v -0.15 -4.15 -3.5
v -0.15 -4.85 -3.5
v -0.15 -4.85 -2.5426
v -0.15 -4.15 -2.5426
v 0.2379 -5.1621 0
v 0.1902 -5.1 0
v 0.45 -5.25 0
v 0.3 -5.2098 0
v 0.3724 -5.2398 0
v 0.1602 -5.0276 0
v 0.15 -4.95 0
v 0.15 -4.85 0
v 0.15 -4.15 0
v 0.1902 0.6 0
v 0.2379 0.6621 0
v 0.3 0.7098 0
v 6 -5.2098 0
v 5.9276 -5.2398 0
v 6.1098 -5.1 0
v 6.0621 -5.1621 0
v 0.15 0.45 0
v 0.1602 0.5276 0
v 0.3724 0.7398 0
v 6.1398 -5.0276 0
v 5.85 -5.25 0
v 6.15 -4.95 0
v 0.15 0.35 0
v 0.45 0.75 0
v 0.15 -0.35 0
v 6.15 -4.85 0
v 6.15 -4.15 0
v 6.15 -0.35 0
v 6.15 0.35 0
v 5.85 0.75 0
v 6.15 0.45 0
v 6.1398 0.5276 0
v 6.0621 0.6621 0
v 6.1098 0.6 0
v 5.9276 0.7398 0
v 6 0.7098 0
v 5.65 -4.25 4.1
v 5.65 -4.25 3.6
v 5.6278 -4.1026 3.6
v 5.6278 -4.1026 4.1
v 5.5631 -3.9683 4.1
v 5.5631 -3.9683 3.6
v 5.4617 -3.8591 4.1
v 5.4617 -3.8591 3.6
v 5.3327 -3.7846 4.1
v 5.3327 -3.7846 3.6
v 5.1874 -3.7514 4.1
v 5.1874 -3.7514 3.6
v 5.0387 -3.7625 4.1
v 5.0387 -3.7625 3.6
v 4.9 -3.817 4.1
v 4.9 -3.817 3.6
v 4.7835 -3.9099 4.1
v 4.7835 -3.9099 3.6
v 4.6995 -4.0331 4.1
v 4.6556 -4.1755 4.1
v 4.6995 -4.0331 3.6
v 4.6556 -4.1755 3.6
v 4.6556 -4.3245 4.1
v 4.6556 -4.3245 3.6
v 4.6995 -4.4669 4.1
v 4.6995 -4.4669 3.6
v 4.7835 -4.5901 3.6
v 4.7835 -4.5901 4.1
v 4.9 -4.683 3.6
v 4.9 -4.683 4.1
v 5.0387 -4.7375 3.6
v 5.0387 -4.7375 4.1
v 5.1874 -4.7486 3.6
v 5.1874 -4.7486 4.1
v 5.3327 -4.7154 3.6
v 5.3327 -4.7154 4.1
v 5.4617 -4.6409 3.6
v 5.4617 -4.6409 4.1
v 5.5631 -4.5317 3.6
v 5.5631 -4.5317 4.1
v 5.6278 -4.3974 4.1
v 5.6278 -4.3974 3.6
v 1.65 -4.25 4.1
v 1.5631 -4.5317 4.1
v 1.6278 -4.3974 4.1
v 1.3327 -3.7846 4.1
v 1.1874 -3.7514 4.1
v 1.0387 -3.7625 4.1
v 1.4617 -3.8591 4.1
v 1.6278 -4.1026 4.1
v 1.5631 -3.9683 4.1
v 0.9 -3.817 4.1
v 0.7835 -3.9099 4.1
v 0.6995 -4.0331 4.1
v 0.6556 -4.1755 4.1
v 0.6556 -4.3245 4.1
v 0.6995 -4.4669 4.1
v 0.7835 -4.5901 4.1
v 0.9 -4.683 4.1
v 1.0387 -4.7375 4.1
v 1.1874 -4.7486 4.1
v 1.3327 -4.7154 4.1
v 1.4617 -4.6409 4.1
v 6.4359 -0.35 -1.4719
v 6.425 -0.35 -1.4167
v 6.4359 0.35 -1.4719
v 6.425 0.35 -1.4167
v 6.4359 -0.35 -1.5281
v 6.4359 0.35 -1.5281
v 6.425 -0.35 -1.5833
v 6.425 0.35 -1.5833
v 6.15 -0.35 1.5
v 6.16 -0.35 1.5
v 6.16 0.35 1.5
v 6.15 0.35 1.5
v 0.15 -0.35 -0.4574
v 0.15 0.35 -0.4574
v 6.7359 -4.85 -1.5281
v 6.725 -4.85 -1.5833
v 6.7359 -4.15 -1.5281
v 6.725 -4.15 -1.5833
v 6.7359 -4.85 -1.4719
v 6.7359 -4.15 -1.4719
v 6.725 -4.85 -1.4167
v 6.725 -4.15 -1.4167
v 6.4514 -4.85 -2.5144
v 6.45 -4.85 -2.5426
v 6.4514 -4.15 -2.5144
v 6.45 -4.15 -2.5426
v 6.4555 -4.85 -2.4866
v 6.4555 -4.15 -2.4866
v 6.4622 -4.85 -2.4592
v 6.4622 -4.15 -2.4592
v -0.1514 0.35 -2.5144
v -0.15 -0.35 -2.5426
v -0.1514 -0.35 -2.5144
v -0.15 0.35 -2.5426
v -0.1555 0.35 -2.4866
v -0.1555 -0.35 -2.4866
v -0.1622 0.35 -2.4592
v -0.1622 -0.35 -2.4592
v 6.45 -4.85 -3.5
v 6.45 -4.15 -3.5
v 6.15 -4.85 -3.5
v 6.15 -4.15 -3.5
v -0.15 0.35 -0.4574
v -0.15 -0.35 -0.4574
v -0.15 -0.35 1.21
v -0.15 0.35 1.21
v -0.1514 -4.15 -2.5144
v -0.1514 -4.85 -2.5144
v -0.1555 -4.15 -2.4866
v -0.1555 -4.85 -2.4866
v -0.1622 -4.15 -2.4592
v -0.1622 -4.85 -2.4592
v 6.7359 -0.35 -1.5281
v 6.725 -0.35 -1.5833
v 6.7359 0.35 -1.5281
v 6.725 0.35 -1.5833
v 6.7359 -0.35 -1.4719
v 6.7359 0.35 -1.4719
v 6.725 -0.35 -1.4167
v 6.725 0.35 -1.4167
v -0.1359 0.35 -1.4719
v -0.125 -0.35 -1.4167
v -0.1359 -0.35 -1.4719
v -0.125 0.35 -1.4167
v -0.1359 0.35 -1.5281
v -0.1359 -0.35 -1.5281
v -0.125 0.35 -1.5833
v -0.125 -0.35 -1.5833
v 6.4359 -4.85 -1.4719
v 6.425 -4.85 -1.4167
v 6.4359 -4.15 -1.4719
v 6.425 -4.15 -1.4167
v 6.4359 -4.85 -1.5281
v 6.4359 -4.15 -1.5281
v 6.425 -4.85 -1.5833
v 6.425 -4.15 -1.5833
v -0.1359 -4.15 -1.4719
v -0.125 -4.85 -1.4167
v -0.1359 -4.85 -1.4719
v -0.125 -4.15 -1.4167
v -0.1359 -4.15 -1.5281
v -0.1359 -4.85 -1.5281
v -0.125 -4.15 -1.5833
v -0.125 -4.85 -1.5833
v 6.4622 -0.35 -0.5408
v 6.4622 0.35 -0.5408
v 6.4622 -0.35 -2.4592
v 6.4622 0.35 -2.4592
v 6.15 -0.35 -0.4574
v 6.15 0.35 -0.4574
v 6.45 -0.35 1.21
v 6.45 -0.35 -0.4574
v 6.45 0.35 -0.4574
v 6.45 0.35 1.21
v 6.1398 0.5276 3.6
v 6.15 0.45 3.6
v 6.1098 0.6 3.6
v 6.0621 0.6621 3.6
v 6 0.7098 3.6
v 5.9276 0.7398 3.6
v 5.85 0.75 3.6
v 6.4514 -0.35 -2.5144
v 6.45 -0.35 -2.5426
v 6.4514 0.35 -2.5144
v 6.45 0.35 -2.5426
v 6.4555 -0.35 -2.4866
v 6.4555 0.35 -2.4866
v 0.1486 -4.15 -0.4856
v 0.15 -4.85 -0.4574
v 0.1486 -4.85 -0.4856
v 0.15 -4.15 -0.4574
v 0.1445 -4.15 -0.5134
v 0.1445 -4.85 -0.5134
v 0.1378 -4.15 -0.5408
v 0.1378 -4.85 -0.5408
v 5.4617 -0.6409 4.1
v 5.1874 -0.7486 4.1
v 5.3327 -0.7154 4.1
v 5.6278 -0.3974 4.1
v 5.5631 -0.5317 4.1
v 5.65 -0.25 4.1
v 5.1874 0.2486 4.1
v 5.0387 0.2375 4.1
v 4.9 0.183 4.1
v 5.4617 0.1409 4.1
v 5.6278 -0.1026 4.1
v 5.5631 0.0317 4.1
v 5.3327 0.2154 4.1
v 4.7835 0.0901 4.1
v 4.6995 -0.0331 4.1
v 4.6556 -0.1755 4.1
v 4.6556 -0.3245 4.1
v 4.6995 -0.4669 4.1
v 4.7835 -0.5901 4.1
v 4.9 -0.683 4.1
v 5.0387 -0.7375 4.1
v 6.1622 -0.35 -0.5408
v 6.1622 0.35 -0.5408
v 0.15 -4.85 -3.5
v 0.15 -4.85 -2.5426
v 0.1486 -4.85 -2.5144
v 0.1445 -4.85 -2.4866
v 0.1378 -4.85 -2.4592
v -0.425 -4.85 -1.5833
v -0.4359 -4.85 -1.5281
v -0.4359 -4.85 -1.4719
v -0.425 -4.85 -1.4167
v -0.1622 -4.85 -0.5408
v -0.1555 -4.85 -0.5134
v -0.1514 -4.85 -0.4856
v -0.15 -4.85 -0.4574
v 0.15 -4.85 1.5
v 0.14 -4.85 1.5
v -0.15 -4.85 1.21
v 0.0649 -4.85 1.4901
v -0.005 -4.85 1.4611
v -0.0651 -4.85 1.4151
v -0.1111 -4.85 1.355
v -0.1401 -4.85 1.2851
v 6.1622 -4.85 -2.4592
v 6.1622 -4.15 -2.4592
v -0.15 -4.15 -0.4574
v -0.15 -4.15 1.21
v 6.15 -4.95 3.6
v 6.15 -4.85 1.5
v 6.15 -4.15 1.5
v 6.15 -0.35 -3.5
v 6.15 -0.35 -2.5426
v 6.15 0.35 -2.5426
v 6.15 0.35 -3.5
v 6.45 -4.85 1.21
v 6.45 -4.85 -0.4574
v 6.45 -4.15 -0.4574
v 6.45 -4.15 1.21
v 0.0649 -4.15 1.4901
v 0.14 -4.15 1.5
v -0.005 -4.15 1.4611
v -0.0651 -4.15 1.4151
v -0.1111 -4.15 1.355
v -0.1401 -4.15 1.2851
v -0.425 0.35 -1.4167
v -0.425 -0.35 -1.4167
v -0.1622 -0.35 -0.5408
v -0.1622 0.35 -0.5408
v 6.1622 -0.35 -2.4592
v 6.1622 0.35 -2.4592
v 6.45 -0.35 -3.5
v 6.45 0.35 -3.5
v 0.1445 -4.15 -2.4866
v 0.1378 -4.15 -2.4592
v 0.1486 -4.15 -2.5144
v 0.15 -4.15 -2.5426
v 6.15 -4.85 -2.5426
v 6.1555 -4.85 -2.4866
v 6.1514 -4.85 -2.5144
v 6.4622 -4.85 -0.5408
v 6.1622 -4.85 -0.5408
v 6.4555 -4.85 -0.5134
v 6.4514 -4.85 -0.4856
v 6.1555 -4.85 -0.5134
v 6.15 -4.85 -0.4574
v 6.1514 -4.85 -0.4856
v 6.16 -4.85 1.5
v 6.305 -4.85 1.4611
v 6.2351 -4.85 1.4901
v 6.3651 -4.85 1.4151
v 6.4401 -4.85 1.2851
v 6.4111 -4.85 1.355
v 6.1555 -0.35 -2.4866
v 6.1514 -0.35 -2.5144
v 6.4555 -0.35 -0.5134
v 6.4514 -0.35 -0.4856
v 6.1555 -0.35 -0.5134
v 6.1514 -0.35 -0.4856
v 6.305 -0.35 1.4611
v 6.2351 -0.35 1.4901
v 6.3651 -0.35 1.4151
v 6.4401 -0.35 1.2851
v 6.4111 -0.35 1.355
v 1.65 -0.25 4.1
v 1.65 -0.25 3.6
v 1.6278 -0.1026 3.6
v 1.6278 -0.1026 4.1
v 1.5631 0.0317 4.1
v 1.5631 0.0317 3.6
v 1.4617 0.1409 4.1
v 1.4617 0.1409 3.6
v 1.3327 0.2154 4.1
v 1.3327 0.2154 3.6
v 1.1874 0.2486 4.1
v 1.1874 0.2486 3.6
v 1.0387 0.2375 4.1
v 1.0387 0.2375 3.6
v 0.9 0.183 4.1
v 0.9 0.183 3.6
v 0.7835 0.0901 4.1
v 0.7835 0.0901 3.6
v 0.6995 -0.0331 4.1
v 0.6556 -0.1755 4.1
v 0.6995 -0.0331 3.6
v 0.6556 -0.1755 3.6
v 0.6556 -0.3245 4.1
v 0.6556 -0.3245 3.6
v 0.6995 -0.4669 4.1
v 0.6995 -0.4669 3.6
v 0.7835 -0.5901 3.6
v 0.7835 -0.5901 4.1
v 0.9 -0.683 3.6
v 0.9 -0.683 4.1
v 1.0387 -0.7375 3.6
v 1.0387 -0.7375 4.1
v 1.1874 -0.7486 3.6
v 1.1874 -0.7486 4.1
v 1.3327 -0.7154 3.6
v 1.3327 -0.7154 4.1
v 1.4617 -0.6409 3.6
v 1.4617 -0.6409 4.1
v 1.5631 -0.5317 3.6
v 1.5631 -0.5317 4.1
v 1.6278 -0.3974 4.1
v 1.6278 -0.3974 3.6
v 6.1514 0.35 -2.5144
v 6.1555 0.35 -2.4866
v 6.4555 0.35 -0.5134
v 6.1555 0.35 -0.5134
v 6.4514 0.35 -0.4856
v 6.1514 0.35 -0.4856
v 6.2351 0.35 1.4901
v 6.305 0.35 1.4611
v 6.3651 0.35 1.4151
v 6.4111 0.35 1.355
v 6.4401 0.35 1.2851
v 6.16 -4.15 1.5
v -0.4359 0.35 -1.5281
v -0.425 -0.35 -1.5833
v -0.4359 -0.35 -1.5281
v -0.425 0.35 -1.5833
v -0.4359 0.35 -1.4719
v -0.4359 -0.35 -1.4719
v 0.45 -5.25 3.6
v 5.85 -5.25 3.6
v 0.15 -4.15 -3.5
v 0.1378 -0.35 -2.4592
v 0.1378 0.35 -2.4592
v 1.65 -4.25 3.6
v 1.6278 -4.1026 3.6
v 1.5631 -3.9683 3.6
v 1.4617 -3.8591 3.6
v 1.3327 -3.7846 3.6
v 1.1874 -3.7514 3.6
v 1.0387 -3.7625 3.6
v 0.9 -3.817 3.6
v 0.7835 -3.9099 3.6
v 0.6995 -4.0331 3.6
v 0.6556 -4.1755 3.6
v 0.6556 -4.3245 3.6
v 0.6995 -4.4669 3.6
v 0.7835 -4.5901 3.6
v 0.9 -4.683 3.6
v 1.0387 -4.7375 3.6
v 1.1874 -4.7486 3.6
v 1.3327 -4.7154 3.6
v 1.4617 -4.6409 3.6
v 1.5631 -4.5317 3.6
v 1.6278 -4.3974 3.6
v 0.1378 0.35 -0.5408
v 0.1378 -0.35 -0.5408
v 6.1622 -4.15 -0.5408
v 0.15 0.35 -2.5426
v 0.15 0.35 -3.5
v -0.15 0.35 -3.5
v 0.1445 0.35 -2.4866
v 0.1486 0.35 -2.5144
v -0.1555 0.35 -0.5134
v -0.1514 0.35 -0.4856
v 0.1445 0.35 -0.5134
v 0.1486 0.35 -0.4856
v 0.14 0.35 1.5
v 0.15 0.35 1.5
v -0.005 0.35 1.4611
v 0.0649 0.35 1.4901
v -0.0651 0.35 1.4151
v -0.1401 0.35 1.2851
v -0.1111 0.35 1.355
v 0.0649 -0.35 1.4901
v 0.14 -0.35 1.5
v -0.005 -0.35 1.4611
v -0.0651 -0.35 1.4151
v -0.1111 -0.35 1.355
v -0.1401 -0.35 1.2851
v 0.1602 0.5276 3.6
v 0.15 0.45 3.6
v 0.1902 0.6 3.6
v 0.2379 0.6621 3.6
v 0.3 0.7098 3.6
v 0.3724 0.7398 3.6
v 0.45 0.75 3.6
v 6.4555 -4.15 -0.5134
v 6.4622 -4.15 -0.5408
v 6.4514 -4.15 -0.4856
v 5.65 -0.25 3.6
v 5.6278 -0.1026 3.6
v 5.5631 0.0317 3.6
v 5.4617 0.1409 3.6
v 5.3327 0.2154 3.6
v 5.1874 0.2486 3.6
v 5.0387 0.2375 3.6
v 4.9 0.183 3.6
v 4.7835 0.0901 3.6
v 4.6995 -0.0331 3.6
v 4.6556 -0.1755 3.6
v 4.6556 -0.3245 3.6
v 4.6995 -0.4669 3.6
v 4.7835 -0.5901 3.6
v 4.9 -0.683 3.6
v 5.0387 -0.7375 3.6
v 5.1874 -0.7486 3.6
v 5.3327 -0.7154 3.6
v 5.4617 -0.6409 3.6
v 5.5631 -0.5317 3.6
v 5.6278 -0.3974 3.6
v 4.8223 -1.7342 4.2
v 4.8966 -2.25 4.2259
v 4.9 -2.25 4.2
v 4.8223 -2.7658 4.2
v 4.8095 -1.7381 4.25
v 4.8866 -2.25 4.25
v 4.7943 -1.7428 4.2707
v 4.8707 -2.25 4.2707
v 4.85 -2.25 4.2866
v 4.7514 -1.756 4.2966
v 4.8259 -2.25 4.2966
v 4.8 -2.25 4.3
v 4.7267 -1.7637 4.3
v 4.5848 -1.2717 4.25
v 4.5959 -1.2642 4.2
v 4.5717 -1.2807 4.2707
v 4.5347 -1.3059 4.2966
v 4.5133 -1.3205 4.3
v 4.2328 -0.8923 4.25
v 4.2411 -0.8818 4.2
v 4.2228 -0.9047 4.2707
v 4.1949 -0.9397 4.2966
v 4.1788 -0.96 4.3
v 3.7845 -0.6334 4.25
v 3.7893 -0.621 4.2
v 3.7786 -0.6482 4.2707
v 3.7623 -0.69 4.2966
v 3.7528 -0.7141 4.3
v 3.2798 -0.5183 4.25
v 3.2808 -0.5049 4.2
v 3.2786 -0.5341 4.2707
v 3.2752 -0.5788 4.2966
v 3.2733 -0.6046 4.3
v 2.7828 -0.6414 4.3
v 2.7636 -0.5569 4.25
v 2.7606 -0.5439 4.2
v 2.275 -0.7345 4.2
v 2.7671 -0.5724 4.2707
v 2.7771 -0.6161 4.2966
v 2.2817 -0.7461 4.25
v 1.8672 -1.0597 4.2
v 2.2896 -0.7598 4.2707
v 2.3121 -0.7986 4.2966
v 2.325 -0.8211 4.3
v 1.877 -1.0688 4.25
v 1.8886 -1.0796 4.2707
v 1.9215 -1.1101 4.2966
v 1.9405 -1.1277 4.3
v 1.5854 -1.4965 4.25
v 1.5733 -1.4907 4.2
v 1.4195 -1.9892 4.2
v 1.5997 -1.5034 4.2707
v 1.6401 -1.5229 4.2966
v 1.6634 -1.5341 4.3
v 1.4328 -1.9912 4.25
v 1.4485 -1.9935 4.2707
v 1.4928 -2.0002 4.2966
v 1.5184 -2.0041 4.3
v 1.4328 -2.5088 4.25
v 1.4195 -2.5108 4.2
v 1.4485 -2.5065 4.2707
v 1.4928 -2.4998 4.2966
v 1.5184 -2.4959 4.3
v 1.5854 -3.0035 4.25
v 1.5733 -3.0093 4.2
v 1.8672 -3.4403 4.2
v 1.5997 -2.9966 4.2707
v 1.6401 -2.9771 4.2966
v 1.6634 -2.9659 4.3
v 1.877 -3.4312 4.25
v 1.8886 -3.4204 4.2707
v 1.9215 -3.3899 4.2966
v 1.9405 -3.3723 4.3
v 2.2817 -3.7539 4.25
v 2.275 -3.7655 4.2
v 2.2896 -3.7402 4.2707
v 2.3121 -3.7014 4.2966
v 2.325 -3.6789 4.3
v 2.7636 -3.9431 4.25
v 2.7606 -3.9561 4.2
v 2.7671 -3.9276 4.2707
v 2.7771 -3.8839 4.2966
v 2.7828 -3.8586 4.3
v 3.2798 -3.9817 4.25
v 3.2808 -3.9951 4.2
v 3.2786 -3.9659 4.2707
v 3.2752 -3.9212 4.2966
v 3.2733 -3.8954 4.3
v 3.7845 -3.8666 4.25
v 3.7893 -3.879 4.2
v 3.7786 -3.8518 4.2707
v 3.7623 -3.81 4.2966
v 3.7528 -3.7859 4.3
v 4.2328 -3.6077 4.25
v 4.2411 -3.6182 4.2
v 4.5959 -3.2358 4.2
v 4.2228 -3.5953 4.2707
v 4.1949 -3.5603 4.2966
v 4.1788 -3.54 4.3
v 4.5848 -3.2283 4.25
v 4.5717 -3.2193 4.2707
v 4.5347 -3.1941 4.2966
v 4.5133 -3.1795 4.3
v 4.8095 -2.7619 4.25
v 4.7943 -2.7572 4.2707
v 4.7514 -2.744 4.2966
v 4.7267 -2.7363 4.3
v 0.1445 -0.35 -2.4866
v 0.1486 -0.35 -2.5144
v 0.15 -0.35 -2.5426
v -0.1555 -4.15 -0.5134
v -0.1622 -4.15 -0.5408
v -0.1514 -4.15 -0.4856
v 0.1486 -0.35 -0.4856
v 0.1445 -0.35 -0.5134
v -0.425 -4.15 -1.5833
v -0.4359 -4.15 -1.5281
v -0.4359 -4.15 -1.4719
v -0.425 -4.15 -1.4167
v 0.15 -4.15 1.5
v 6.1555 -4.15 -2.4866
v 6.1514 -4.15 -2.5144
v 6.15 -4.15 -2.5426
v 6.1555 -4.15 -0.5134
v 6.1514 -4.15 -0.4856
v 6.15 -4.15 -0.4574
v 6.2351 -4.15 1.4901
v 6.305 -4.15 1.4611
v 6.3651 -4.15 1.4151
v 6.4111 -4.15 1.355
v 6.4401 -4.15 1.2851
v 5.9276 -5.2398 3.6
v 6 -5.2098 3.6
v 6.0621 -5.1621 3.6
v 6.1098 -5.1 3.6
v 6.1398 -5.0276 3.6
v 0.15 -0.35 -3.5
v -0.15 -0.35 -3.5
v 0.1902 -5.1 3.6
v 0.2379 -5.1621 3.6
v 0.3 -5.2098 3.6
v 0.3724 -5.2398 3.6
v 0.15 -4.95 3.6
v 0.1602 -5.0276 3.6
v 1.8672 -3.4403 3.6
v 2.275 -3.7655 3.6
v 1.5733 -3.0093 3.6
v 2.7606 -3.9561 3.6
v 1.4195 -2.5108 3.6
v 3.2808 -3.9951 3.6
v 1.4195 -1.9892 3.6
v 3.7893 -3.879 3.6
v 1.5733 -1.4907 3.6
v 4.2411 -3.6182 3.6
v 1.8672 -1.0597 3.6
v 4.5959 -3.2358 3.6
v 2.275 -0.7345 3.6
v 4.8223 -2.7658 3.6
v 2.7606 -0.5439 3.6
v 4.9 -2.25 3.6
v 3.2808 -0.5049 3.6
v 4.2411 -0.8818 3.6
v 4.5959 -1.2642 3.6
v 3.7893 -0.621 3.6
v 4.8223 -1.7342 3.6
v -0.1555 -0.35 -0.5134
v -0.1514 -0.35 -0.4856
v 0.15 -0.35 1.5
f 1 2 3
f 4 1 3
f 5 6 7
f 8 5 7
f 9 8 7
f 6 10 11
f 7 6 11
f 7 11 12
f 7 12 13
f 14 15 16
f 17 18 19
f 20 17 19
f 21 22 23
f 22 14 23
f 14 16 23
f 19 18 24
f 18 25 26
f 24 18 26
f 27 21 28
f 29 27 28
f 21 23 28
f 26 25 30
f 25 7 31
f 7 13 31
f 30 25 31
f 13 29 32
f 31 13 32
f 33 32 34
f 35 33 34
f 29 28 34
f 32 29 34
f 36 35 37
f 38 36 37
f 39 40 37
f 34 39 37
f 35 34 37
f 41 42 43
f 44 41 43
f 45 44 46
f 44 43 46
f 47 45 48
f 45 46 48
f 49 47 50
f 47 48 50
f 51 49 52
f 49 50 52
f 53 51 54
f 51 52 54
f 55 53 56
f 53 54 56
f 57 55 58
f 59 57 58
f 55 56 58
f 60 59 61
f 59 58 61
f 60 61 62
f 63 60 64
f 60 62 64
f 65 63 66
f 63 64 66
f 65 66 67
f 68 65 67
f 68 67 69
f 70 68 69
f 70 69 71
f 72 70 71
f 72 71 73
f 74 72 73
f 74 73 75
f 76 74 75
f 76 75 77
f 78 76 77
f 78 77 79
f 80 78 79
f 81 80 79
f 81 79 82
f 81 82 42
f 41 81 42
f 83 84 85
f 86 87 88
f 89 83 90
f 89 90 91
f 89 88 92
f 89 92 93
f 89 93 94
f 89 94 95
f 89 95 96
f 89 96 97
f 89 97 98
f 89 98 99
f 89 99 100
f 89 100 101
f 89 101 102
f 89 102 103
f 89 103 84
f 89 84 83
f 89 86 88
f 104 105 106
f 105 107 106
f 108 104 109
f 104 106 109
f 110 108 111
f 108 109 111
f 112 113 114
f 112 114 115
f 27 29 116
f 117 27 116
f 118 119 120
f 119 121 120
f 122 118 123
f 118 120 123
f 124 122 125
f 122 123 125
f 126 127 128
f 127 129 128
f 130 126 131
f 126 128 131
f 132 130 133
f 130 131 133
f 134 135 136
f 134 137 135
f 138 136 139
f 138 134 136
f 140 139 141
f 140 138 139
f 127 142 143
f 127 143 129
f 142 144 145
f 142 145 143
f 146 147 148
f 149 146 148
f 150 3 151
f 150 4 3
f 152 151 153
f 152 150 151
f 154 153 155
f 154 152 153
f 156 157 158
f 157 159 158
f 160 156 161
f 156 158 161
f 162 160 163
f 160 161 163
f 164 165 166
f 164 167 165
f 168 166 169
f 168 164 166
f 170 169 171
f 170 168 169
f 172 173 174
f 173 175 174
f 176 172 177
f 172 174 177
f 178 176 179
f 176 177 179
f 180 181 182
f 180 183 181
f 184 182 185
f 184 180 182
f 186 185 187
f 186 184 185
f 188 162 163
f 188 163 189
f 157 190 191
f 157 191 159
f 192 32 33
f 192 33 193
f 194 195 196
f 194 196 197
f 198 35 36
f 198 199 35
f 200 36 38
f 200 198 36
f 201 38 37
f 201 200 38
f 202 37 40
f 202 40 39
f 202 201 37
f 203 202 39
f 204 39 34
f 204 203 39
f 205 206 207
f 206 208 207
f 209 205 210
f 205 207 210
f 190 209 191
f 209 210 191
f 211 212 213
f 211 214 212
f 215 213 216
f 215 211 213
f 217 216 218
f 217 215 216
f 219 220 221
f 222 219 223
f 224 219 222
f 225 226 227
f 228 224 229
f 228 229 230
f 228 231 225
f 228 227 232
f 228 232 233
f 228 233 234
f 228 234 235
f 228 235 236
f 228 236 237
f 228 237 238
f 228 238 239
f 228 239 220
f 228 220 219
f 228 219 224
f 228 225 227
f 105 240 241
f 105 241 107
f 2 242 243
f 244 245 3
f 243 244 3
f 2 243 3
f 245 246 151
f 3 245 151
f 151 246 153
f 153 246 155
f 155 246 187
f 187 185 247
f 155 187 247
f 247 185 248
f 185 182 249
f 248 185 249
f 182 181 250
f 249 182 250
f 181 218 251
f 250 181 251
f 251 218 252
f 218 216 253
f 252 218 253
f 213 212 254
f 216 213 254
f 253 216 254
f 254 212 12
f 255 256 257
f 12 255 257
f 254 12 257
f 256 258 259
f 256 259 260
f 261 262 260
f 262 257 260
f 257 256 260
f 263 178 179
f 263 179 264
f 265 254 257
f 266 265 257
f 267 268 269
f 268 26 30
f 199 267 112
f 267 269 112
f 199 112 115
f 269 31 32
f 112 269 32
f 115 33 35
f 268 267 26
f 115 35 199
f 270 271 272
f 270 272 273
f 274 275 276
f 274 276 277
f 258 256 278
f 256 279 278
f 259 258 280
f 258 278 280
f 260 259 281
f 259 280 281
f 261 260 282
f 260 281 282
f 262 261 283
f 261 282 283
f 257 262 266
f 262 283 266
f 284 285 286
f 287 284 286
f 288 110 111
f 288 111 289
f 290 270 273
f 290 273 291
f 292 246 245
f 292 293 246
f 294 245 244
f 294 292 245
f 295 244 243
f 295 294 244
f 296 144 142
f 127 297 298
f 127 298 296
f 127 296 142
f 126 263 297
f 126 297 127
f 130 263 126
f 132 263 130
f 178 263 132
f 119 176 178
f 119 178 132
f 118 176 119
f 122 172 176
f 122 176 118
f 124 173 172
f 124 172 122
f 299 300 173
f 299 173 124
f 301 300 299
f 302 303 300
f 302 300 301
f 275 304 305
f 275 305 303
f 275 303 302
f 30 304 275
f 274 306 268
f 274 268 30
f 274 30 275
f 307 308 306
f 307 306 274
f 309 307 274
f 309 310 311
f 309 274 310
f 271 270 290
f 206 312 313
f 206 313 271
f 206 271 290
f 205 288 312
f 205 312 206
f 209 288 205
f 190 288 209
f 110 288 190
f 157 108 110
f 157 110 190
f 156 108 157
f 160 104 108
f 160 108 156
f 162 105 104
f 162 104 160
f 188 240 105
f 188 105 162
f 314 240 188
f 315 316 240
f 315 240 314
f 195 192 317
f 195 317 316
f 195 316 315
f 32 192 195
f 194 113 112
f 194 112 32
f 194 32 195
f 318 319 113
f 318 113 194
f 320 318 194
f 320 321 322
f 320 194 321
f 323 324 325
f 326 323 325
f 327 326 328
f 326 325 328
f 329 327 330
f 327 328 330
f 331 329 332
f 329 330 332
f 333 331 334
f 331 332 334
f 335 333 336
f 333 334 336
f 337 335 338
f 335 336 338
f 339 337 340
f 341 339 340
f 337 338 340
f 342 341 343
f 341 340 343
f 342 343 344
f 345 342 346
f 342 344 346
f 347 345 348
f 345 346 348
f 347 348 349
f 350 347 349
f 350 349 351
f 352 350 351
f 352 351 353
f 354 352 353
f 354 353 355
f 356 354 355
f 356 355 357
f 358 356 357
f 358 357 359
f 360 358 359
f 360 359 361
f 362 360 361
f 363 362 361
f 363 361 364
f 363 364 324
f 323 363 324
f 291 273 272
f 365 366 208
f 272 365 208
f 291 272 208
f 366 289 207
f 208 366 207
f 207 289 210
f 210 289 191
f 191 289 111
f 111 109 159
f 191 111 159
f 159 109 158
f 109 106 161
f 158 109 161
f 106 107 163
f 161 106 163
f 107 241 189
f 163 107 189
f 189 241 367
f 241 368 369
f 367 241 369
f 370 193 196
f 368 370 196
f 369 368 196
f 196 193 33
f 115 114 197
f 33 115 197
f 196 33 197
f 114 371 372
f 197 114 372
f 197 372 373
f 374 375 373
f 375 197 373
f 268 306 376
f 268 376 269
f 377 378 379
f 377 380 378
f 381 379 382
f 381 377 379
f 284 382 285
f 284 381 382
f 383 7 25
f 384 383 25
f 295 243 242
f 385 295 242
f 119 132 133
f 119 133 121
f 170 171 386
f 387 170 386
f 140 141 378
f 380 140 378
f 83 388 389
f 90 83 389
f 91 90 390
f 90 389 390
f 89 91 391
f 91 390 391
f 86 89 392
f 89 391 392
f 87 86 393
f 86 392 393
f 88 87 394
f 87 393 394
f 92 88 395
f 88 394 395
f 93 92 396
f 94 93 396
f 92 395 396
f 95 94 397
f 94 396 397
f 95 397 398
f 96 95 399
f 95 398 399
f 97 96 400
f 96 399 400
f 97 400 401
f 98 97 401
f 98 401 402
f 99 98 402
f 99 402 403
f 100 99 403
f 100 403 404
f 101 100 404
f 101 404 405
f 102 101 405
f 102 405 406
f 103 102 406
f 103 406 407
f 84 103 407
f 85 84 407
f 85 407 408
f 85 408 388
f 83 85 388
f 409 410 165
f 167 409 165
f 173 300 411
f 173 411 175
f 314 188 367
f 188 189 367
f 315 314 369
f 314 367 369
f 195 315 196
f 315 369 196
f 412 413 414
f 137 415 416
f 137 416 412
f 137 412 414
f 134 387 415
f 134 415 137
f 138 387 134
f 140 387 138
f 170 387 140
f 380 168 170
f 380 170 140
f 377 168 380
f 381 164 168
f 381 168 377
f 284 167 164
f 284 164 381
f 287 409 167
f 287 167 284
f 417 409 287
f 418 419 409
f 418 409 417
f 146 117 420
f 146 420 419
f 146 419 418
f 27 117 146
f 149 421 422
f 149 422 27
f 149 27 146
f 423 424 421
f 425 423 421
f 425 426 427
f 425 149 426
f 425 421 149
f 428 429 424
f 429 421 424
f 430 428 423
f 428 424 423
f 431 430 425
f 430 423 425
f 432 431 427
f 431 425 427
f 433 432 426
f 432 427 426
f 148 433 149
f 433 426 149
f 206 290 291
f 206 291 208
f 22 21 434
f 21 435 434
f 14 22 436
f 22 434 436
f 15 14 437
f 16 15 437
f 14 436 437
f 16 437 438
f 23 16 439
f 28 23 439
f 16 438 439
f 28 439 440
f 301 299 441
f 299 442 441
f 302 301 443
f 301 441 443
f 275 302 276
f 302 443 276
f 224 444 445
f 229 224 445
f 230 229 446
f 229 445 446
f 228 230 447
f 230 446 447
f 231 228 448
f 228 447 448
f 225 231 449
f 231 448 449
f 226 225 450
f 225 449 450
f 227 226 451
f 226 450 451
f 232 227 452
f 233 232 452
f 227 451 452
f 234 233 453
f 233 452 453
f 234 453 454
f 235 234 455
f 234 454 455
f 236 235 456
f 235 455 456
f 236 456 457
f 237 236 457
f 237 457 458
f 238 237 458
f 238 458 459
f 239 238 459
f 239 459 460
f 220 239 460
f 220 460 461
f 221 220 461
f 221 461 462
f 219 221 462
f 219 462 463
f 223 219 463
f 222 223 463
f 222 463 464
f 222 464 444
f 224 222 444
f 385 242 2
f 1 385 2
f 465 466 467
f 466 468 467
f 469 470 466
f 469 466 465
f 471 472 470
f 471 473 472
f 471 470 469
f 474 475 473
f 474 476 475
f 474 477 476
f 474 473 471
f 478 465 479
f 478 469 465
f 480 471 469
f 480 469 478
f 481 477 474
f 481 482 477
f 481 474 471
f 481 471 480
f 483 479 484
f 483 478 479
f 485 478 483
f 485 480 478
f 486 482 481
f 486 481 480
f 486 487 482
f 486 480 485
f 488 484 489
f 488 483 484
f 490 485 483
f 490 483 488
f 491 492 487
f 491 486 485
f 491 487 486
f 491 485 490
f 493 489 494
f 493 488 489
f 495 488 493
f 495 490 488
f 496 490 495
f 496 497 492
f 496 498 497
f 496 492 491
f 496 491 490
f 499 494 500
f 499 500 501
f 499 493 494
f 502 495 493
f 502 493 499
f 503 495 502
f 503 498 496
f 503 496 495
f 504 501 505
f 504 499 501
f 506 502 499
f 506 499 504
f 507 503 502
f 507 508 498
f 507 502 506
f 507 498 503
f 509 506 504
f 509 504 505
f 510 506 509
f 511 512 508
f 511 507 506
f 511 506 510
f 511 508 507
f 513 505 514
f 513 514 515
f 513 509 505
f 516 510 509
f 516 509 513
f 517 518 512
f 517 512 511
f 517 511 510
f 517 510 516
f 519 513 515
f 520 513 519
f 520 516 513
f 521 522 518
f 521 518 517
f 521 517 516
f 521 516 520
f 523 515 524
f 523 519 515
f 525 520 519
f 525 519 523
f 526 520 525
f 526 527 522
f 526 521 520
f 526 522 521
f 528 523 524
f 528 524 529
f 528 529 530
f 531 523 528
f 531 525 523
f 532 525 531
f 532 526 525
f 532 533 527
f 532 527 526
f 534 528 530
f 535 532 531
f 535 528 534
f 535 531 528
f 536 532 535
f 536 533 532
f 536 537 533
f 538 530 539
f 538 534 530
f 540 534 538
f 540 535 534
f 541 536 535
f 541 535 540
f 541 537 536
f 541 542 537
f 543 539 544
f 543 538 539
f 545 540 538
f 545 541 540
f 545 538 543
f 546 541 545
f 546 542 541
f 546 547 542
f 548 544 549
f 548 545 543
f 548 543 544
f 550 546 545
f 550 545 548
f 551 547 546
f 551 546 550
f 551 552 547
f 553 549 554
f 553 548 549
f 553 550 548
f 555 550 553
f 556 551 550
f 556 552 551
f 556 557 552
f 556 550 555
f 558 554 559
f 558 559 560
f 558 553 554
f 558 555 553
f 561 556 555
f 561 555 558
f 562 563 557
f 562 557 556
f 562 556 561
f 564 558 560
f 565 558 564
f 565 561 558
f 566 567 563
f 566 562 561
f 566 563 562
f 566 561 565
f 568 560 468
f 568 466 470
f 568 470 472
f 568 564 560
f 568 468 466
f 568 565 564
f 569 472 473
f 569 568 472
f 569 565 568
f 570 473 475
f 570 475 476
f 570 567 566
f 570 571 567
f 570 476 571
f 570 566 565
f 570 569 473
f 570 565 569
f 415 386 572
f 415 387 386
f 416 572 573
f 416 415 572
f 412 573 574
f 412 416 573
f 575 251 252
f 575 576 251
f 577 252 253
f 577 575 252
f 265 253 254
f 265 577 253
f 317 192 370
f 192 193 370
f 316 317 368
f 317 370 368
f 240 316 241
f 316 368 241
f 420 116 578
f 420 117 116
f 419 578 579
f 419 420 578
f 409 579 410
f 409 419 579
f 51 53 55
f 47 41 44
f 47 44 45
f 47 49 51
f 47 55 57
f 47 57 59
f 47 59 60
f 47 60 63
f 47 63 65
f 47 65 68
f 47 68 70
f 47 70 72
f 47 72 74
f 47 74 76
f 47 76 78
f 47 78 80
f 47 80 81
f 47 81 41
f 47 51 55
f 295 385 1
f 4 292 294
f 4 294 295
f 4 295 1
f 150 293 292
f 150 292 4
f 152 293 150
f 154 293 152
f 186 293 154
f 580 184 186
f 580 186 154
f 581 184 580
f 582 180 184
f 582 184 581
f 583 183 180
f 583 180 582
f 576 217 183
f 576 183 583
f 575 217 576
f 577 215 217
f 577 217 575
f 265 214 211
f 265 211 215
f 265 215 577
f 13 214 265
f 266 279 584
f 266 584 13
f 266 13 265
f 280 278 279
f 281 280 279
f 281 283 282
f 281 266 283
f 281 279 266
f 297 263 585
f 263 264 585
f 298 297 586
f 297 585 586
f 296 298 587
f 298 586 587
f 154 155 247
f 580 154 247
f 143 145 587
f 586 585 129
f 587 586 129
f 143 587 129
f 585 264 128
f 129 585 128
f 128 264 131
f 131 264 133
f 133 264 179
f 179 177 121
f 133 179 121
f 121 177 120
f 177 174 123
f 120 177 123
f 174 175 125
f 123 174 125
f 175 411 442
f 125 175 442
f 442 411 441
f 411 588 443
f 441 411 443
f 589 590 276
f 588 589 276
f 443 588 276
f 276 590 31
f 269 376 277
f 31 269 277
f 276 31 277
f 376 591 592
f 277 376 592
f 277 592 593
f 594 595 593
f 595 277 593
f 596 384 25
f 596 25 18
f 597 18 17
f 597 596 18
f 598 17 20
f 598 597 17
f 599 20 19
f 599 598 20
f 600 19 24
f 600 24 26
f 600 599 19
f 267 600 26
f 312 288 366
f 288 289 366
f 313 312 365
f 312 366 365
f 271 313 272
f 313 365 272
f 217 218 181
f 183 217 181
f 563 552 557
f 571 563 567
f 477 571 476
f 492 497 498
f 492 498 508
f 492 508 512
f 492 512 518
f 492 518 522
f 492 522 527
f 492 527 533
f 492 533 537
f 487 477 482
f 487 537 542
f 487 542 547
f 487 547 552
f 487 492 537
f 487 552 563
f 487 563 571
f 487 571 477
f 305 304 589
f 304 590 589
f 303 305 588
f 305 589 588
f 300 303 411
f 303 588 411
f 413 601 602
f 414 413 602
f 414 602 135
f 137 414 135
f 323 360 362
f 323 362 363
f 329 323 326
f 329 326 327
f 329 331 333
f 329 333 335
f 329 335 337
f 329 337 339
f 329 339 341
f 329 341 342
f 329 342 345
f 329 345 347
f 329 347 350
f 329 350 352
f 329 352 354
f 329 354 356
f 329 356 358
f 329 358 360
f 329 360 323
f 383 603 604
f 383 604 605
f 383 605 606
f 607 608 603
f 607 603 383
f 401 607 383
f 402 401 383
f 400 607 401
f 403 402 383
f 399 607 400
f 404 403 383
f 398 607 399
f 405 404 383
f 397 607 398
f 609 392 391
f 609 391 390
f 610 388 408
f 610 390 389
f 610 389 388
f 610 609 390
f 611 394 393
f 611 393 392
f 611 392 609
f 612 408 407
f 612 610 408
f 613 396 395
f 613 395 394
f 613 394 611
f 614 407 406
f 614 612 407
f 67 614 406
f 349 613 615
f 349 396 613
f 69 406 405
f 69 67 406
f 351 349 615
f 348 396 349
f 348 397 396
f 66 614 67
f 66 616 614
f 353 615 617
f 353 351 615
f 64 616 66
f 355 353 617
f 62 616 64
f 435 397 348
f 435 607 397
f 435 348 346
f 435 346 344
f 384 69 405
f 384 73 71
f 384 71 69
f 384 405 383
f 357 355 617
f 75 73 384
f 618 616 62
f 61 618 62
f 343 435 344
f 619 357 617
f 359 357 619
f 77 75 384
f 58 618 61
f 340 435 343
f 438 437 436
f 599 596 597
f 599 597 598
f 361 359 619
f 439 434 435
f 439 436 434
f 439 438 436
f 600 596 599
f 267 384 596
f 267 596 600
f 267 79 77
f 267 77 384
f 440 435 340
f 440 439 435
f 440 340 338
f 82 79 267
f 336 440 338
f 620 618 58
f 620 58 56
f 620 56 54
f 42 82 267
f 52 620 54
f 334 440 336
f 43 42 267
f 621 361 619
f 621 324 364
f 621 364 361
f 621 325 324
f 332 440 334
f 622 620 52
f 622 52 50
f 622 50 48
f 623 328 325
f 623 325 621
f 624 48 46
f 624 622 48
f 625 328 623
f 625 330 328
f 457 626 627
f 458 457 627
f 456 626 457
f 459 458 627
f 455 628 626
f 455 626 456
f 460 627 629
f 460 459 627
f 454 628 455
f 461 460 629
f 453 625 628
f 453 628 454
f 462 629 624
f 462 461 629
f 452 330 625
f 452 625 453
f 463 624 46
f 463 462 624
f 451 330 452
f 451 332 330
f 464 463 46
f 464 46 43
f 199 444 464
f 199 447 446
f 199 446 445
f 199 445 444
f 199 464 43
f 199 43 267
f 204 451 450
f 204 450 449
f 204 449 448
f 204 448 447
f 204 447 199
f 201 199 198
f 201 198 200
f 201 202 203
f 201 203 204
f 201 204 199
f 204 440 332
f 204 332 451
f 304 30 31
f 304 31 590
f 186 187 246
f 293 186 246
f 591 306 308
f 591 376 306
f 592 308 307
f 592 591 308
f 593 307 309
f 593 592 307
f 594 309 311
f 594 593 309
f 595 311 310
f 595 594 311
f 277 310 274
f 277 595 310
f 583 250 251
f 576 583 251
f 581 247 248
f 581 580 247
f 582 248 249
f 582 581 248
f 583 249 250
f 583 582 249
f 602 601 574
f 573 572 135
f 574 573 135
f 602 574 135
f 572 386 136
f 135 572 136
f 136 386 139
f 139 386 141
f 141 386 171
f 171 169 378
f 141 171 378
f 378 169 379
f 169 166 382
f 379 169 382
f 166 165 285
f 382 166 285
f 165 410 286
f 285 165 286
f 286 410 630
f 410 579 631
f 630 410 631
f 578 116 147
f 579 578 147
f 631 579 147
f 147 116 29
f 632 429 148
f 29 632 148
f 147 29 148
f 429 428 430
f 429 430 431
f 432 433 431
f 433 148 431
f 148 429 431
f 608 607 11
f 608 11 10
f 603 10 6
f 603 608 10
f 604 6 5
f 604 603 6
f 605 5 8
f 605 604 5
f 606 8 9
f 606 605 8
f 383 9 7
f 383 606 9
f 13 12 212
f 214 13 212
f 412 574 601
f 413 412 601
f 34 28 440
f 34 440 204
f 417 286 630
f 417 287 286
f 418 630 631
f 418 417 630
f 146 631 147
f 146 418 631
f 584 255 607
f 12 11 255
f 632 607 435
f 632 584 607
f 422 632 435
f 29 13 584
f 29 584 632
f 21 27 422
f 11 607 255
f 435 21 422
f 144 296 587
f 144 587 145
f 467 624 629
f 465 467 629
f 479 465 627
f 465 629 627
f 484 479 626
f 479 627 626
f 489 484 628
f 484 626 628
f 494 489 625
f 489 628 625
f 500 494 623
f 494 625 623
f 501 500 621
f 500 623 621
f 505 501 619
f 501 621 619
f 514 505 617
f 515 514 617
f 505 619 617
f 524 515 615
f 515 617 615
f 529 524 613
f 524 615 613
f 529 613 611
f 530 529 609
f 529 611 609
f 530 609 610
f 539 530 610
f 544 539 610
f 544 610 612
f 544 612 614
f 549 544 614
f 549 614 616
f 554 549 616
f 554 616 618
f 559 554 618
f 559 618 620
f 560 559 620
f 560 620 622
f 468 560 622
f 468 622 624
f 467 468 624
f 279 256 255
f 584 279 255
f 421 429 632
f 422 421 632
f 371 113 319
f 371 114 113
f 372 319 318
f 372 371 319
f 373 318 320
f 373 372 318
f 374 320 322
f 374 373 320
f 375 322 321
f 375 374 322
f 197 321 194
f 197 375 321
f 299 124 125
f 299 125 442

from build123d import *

# Parameters (mm, degrees)
SKETCH001_W  = 6
SKETCH001_H  = 6
PAD001_DEPTH = 0.1
FILLET001_R  = 0.3
PAD008_DEPTH = 0.7
FILLET003_R  = 0.29
PAD009_DEPTH = 0.7
FILLET004_R  = 0.29
PAD010_DEPTH = 0.7
FILLET005_R  = 0.29
SKETCH_W     = 6
SKETCH_H     = 6
PAD_DEPTH    = 3.5
FILLET_R     = 0.3
SKETCH004_R  = 0.5
PAD003_DEPTH = 0.6
SKETCH003_R  = 0.5
PAD004_DEPTH = 0.6
SKETCH005_R  = 0.5
PAD002_DEPTH = 0.6
SKETCH002_R  = 0.5
PAD005_DEPTH = 0.6
SKETCH006_R  = 1.75
PAD006_DEPTH = 0.8
FILLET006_R  = 0.1
PAD007_DEPTH = 0.7
FILLET002_R  = 0.29


with BuildPart() as fillet001:
    # Sketch001 → Pad001 (new body)
    with BuildSketch(Plane.XY.offset(3.5)):
        with Locations((3.15, -2.25)):
            Rectangle(SKETCH001_W, SKETCH001_H)
    extrude(amount=PAD001_DEPTH)

    # Fillet001
    fillet001_edges = [fillet001.edges().sort_by_distance(p)[0] for p in [
        (6.15, -5.25, 3.55),
        (0.15, -5.25, 3.55),
        (6.15, 0.75, 3.55),
        (0.15, 0.75, 3.55),
    ]]
    fillet(fillet001_edges, radius=FILLET001_R)


with BuildPart() as fillet003:
    # Sketch008 → Pad008 (new body)
    with BuildSketch(Plane.XZ.offset(0.35)):
        Polygon((-0.15, 1.5), (0.15, 1.5), (0.15, -0.5), (-0.15, -1.5), (0.15, -2.5), (0.15, -3.5), (-0.15, -3.5), (-0.15, -2.5), (-0.45, -1.5), (-0.15, -0.5), align=None)
    extrude(amount=-PAD008_DEPTH)

    # Fillet003
    fillet003_edges = [fillet003.edges().sort_by_distance(p)[0] for p in [
        (-0.15, 0, -2.5),
        (-0.15, 0, -0.5),
        (-0.45, 0, -1.5),
        (-0.15, 0, 1.5),
        (0.15, 0, -0.5),
        (-0.15, 0, -1.5),
        (0.15, 0, -2.5),
    ]]
    fillet(fillet003_edges, radius=FILLET003_R)


with BuildPart() as fillet004:
    # Sketch009 → Pad009 (new body)
    with BuildSketch(Plane.XZ.offset(4.85)):
        Polygon((6.45, 1.5), (6.15, 1.5), (6.15, -0.5), (6.45, -1.5), (6.15, -2.5), (6.15, -3.5), (6.45, -3.5), (6.45, -2.5), (6.75, -1.5), (6.45, -0.5), align=None)
    extrude(amount=-PAD009_DEPTH)

    # Fillet004
    fillet004_edges = [fillet004.edges().sort_by_distance(p)[0] for p in [
        (6.45, -4.5, -2.5),
        (6.45, -4.5, -0.5),
        (6.75, -4.5, -1.5),
        (6.45, -4.5, 1.5),
        (6.15, -4.5, -0.5),
        (6.45, -4.5, -1.5),
        (6.15, -4.5, -2.5),
    ]]
    fillet(fillet004_edges, radius=FILLET004_R)


with BuildPart() as fillet005:
    # Sketch010 → Pad010 (new body)
    with BuildSketch(Plane.XZ.offset(0.35)):
        Polygon((6.45, 1.5), (6.15, 1.5), (6.15, -0.5), (6.45, -1.5), (6.15, -2.5), (6.15, -3.5), (6.45, -3.5), (6.45, -2.5), (6.75, -1.5), (6.45, -0.5), align=None)
    extrude(amount=-PAD010_DEPTH)

    # Fillet005
    fillet005_edges = [fillet005.edges().sort_by_distance(p)[0] for p in [
        (6.45, 0, -2.5),
        (6.45, 0, -0.5),
        (6.75, 0, -1.5),
        (6.45, 0, 1.5),
        (6.15, 0, -0.5),
        (6.45, 0, -1.5),
        (6.15, 0, -2.5),
    ]]
    fillet(fillet005_edges, radius=FILLET005_R)


with BuildPart() as fillet_body:
    # Sketch → Pad (new body)
    with BuildSketch(Plane.XY):
        with Locations((3.15, -2.25)):
            Rectangle(SKETCH_W, SKETCH_H)
    extrude(amount=PAD_DEPTH)

    # Fillet
    fillet_edges = [fillet_body.edges().sort_by_distance(p)[0] for p in [
        (6.15, 0.75, 1.75),
        (6.15, -5.25, 1.75),
        (0.15, -5.25, 1.75),
        (0.15, 0.75, 1.75),
    ]]
    fillet(fillet_edges, radius=FILLET_R)


with BuildPart() as pad003:
    # Pad003 base: copy of Fillet body
    add(fillet_body.part)

    # Sketch004 → Pad003 (new body)
    with BuildSketch(Plane.XY.offset(3.5)):
        with Locations((5.15, -0.25)):
            Circle(SKETCH004_R)
    extrude(amount=PAD003_DEPTH)


with BuildPart() as pad004:
    # Pad004 base: copy of Fillet body
    add(fillet_body.part)

    # Sketch003 → Pad004 (new body)
    with BuildSketch(Plane.XY.offset(3.5)):
        with Locations((5.15, -4.25)):
            Circle(SKETCH003_R)
    extrude(amount=PAD004_DEPTH)


with BuildPart() as pad002:
    # Pad002 base: copy of Fillet body
    add(fillet_body.part)

    # Sketch005 → Pad002 (new body)
    with BuildSketch(Plane.XY.offset(3.5)):
        with Locations((1.15, -0.25)):
            Circle(SKETCH005_R)
    extrude(amount=PAD002_DEPTH)


with BuildPart() as pad005:
    # Pad005 base: copy of Fillet body
    add(fillet_body.part)

    # Sketch002 → Pad005 (new body)
    with BuildSketch(Plane.XY.offset(3.5)):
        with Locations((1.15, -4.25)):
            Circle(SKETCH002_R)
    extrude(amount=PAD005_DEPTH)


with BuildPart() as fillet006:
    # Pad006 base: copy of Fillet body
    add(fillet_body.part)

    # Sketch006 → Pad006 (new body)
    with BuildSketch(Plane.XY.offset(3.5)):
        with Locations((3.15, -2.25)):
            Circle(SKETCH006_R)
    extrude(amount=PAD006_DEPTH)

    # Fillet006
    fillet006_edges = [fillet006.edges().sort_by_distance(p)[0] for p in [
        (1.4, -2.25, 4.3),
    ]]
    fillet(fillet006_edges, radius=FILLET006_R)


with BuildPart() as sw_push_6mm:
    # Sketch007 → Pad007 (new body)
    with BuildSketch(Plane.XZ.offset(4.85)):
        Polygon((-0.15, 1.5), (0.15, 1.5), (0.15, -0.5), (-0.15, -1.5), (0.15, -2.5), (0.15, -3.5), (-0.15, -3.5), (-0.15, -2.5), (-0.45, -1.5), (-0.15, -0.5), align=None)
    extrude(amount=-PAD007_DEPTH)

    # Fillet002
    fillet002_edges = [sw_push_6mm.edges().sort_by_distance(p)[0] for p in [
        (-0.15, -4.5, -2.5),
        (-0.15, -4.5, -0.5),
        (-0.45, -4.5, -1.5),
        (-0.15, -4.5, 1.5),
        (0.15, -4.5, -0.5),
        (-0.15, -4.5, -1.5),
        (0.15, -4.5, -2.5),
    ]]
    fillet(fillet002_edges, radius=FILLET002_R)

    # Fillet002_mp_cp: union Fillet001, Fillet003, Fillet004, Fillet005, Pad003, Pad004, Pad002, Pad005, Fillet006
    add(fillet001.part)
    add(fillet003.part)
    add(fillet004.part)
    add(fillet005.part)
    add(pad003.part)
    add(pad004.part)
    add(pad002.part)
    add(pad005.part)
    add(fillet006.part)


solid = sw_push_6mm.part
